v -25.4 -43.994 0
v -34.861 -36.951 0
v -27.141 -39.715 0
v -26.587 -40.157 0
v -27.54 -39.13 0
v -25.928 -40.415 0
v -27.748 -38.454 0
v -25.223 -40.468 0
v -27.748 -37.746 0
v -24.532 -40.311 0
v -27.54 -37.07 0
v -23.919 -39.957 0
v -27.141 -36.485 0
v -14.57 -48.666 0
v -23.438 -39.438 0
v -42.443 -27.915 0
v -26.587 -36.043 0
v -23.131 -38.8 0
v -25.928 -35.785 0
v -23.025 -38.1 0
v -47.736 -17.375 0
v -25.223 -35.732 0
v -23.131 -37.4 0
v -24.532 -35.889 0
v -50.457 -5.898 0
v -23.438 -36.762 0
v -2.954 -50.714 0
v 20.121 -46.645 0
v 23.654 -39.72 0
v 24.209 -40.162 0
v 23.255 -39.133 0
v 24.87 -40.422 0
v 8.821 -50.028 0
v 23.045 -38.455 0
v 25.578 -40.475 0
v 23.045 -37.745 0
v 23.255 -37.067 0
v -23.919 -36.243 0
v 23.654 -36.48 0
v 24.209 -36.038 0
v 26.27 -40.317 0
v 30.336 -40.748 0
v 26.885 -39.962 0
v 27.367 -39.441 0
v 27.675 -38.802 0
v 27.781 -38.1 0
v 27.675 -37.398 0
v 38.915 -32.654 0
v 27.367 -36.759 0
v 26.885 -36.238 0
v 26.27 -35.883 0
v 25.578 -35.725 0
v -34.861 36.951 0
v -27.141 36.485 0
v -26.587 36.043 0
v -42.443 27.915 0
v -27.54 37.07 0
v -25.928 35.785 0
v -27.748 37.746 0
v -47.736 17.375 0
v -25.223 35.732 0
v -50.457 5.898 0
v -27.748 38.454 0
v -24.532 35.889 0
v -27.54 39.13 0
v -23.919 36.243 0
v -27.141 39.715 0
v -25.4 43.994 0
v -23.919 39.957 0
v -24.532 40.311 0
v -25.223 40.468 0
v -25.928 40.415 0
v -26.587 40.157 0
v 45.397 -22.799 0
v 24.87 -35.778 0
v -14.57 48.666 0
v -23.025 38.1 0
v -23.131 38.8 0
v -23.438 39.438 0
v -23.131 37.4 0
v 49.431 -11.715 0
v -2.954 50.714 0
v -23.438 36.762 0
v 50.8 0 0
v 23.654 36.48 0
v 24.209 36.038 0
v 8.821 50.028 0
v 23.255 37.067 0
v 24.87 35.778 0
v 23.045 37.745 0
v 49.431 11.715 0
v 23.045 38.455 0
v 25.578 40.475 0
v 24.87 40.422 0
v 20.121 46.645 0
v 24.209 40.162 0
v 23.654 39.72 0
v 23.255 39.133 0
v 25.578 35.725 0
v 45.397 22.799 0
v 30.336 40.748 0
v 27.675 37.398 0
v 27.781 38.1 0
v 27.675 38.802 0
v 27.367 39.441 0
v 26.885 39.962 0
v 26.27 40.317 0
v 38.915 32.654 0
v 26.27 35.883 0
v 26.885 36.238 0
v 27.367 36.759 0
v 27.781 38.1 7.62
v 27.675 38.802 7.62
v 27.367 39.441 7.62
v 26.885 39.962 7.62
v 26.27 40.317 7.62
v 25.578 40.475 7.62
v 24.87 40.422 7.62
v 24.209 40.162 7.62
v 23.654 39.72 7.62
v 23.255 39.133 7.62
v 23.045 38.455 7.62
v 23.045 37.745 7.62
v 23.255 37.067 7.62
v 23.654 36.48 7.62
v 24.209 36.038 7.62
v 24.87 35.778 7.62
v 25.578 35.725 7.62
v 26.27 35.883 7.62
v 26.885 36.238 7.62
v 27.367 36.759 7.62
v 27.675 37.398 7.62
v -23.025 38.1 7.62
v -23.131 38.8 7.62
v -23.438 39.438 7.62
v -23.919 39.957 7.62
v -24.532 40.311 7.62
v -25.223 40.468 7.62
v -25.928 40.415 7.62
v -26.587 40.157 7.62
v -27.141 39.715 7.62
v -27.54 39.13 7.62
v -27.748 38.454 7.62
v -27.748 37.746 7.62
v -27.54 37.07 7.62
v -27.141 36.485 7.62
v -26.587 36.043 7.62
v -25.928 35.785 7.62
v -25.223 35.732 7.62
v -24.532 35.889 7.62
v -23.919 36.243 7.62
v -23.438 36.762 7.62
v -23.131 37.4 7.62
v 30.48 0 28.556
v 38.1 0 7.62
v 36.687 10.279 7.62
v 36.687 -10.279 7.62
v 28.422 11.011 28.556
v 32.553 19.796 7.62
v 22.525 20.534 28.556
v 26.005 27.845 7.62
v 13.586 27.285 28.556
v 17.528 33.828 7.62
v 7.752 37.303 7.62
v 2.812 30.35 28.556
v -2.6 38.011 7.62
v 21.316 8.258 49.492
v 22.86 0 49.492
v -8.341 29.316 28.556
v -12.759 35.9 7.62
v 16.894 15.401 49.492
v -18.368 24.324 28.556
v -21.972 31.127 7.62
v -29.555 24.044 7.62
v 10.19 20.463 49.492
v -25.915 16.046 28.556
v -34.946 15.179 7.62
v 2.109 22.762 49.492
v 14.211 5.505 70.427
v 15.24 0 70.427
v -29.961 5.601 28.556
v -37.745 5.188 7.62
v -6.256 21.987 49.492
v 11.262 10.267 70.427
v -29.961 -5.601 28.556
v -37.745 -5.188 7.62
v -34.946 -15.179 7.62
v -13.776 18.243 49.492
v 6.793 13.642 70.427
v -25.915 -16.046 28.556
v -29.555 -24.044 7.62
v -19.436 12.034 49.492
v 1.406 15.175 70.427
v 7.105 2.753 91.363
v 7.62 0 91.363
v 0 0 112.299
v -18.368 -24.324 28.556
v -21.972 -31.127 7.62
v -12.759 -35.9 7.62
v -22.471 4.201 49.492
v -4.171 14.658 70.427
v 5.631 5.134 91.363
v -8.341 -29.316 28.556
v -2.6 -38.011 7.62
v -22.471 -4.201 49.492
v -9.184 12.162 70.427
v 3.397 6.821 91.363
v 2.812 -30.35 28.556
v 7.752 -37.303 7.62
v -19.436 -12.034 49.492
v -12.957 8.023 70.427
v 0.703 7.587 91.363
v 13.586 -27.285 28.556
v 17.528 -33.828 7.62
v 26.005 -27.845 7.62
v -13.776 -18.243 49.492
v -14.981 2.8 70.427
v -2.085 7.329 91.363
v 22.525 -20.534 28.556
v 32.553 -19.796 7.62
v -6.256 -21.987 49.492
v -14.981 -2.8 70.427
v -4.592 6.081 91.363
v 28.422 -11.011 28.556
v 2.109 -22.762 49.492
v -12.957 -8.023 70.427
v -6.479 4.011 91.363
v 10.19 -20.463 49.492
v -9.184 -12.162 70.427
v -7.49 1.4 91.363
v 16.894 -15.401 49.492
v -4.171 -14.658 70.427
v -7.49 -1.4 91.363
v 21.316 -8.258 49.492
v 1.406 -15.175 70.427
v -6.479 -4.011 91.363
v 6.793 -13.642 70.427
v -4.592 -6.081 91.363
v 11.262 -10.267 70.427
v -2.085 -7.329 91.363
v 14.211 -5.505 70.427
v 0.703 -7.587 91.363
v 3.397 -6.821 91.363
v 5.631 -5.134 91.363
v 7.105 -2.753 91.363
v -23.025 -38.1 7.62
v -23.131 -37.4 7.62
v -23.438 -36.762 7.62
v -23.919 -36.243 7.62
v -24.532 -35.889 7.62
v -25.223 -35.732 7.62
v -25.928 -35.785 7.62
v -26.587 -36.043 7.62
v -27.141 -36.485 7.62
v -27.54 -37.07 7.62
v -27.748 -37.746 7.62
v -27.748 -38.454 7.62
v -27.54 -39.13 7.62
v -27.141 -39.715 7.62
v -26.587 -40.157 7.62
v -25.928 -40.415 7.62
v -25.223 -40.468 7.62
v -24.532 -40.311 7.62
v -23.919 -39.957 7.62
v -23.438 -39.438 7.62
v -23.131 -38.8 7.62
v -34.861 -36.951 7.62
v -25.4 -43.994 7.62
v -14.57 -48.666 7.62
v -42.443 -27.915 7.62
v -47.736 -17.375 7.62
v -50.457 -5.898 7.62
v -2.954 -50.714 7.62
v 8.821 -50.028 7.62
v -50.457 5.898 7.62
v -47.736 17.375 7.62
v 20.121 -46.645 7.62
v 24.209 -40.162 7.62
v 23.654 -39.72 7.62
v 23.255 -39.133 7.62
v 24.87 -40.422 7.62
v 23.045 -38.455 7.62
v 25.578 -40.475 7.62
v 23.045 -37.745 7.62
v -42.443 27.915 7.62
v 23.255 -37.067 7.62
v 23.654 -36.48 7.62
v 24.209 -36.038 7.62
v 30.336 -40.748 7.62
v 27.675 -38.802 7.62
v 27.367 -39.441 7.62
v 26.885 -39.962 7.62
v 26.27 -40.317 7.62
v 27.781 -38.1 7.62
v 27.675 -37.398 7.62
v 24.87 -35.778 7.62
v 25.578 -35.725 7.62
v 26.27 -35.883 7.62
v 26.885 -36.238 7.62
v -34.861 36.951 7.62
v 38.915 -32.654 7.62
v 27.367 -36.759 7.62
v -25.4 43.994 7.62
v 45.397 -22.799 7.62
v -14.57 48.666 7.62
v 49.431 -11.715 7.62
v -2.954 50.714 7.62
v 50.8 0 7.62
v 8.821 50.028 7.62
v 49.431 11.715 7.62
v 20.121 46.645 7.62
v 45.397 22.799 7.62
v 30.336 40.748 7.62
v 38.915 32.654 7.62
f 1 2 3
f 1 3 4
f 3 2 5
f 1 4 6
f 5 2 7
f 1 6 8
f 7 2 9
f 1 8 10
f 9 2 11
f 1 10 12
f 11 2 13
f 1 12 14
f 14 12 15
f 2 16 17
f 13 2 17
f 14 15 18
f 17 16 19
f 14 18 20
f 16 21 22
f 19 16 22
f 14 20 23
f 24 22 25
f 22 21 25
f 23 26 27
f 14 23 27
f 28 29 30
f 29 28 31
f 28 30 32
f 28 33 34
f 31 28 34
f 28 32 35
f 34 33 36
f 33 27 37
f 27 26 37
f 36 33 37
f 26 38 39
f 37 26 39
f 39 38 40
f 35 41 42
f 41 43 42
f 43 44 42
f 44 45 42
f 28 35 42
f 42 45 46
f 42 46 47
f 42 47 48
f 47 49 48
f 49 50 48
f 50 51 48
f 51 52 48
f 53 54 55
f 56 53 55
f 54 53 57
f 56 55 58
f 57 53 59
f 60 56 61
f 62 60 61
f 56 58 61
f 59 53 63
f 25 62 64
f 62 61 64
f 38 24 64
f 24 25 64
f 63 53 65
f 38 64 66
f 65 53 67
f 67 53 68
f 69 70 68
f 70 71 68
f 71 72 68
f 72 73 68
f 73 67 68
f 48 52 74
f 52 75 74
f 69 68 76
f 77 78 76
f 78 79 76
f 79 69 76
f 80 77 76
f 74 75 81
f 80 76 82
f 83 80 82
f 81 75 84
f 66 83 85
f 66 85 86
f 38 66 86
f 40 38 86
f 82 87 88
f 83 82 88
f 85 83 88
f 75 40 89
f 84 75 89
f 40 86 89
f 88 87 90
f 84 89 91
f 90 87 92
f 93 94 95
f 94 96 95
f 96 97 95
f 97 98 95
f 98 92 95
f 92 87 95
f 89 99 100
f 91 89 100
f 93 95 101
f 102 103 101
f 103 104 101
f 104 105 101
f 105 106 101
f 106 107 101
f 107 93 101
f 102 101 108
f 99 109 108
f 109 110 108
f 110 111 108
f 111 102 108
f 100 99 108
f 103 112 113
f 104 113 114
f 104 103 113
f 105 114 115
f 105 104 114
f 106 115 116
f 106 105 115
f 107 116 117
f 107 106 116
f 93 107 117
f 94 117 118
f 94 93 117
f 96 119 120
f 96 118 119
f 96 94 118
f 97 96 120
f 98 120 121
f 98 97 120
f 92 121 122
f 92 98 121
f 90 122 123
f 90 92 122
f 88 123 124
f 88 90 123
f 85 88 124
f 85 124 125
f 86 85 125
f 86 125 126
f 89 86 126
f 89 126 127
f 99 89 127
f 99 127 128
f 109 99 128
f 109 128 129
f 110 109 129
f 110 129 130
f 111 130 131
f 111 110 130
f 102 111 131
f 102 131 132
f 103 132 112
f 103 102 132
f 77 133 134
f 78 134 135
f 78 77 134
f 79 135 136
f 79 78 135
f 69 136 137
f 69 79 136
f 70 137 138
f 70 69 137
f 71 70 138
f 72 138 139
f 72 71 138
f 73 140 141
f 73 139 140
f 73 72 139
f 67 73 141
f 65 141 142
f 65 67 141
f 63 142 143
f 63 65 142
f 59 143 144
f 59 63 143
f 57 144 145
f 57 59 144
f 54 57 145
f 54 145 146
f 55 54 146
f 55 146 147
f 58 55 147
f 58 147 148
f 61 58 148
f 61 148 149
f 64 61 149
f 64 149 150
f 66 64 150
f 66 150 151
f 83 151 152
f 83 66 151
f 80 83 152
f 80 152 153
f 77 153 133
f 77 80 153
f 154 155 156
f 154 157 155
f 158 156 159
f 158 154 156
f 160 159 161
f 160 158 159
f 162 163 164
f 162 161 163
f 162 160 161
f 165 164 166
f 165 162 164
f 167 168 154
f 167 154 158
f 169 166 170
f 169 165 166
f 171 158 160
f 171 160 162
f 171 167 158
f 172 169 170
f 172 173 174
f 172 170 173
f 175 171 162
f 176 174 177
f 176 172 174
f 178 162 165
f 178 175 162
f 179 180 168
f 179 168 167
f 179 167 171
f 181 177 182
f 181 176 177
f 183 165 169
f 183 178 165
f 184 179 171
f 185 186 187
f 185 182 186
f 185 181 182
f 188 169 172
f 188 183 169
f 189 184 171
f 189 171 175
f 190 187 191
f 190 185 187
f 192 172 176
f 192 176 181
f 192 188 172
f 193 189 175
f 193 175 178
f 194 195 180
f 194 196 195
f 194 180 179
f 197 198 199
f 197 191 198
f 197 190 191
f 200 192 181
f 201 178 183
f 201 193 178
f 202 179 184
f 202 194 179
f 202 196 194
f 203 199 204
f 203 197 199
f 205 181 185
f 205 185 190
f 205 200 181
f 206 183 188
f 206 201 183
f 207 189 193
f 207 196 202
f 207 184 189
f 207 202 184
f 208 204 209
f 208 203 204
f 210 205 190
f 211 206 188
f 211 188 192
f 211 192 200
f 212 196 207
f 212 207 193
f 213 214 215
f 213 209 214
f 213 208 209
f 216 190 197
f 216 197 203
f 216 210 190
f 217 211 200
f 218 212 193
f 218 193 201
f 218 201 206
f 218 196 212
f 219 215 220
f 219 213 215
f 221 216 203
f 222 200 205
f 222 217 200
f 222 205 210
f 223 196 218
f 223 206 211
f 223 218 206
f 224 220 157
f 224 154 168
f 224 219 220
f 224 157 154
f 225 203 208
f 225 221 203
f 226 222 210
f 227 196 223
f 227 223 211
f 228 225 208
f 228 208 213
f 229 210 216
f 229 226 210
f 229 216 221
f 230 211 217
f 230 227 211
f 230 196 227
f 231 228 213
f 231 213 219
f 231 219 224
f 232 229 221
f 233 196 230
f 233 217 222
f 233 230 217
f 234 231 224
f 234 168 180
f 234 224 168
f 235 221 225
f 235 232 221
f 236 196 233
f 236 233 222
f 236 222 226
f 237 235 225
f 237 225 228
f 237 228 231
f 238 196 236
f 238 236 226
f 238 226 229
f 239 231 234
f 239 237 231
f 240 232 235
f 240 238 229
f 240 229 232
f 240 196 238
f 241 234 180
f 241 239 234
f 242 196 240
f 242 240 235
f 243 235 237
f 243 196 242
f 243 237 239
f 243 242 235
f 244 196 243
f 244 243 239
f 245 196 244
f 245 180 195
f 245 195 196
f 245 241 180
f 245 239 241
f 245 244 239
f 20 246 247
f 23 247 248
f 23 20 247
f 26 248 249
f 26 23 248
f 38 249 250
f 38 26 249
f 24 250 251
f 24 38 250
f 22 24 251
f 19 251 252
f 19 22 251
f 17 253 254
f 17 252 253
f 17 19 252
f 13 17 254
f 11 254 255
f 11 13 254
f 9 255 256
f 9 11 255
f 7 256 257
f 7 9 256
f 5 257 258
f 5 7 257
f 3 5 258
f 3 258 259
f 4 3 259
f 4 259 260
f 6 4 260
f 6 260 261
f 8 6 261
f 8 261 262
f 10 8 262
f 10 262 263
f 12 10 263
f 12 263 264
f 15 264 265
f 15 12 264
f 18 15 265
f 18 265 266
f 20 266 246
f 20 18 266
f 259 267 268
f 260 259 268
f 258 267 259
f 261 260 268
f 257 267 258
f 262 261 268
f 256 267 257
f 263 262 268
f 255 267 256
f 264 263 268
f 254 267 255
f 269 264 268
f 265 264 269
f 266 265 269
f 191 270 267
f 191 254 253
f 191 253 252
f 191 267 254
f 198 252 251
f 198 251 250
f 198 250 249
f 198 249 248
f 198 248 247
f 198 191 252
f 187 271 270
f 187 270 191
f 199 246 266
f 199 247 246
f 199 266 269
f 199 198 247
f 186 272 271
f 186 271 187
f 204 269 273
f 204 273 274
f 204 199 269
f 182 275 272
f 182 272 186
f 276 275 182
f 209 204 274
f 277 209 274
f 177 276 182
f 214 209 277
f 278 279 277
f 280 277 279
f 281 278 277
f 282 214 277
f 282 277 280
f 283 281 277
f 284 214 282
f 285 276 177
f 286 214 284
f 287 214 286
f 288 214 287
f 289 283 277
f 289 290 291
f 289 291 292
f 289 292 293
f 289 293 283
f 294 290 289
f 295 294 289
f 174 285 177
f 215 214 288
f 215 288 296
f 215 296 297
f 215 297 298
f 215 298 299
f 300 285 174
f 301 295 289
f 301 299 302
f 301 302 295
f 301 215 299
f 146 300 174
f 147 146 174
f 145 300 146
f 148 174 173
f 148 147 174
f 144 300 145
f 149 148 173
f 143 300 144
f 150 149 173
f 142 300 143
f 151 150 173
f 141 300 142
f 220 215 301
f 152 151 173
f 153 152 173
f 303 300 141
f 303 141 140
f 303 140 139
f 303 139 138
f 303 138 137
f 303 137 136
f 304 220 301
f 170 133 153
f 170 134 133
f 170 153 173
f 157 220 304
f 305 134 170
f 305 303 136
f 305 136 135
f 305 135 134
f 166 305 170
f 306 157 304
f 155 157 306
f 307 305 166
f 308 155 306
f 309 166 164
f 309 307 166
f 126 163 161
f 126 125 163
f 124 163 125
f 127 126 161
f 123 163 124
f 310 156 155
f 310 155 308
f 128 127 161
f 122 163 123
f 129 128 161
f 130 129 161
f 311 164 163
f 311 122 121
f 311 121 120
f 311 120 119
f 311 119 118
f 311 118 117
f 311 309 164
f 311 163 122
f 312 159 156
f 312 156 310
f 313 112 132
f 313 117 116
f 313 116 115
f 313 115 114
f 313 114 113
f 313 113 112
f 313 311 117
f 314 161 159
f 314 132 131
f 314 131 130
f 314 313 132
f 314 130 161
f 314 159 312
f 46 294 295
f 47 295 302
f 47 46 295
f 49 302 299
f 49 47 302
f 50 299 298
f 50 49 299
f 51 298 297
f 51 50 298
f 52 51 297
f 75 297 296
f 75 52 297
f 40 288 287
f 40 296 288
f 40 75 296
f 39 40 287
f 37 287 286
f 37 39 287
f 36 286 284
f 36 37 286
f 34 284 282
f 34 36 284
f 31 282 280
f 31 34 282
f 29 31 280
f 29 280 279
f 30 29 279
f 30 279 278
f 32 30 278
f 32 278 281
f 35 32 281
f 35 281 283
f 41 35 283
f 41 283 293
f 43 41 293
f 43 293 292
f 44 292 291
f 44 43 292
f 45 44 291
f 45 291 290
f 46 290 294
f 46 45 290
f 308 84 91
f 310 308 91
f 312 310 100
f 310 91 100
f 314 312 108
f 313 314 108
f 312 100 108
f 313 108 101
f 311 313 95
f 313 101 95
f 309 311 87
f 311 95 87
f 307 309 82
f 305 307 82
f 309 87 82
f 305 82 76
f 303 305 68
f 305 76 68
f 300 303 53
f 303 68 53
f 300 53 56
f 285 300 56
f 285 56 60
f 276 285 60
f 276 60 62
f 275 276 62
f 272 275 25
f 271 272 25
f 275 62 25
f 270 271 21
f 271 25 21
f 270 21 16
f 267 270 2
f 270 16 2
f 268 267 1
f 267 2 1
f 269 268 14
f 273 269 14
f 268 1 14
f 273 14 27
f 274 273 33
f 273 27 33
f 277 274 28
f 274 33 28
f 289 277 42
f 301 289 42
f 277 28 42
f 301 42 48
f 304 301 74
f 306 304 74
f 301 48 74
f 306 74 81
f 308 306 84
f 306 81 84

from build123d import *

# Parameters (mm, degrees)
F0_R     = 50.8
F1_DEPTH = 7.62
F2_R     = 38.1
F3_DEPTH = 124.206
F3_TAPER = 20
F4_R     = 2.3749
F4_R_2   = 2.38125
F5_DEPTH = 25.4


with BuildPart() as f1:
    # F0 (on Top) → F1 (new body)
    with BuildSketch(Plane.XY):
        Circle(F0_R)
    extrude(amount=F1_DEPTH)

    # F2 (on face) → F3 (join)
    with BuildSketch(Plane.XY.offset(7.62)):
        Circle(F2_R)
    extrude(amount=F3_DEPTH, taper=F3_TAPER)

    # F4 (on Top) → F5 (cut)
    with BuildSketch(Plane.XY):
        with Locations((-25.4, -38.1)):
            Circle(F4_R)
        with Locations((25.4, -38.1)):
            Circle(F4_R_2)
        with Locations((-25.4, 38.1)):
            Circle(F4_R)
        with Locations((25.4, 38.1)):
            Circle(F4_R_2)
    extrude(amount=F5_DEPTH, mode=Mode.SUBTRACT)


solid = f1.part
